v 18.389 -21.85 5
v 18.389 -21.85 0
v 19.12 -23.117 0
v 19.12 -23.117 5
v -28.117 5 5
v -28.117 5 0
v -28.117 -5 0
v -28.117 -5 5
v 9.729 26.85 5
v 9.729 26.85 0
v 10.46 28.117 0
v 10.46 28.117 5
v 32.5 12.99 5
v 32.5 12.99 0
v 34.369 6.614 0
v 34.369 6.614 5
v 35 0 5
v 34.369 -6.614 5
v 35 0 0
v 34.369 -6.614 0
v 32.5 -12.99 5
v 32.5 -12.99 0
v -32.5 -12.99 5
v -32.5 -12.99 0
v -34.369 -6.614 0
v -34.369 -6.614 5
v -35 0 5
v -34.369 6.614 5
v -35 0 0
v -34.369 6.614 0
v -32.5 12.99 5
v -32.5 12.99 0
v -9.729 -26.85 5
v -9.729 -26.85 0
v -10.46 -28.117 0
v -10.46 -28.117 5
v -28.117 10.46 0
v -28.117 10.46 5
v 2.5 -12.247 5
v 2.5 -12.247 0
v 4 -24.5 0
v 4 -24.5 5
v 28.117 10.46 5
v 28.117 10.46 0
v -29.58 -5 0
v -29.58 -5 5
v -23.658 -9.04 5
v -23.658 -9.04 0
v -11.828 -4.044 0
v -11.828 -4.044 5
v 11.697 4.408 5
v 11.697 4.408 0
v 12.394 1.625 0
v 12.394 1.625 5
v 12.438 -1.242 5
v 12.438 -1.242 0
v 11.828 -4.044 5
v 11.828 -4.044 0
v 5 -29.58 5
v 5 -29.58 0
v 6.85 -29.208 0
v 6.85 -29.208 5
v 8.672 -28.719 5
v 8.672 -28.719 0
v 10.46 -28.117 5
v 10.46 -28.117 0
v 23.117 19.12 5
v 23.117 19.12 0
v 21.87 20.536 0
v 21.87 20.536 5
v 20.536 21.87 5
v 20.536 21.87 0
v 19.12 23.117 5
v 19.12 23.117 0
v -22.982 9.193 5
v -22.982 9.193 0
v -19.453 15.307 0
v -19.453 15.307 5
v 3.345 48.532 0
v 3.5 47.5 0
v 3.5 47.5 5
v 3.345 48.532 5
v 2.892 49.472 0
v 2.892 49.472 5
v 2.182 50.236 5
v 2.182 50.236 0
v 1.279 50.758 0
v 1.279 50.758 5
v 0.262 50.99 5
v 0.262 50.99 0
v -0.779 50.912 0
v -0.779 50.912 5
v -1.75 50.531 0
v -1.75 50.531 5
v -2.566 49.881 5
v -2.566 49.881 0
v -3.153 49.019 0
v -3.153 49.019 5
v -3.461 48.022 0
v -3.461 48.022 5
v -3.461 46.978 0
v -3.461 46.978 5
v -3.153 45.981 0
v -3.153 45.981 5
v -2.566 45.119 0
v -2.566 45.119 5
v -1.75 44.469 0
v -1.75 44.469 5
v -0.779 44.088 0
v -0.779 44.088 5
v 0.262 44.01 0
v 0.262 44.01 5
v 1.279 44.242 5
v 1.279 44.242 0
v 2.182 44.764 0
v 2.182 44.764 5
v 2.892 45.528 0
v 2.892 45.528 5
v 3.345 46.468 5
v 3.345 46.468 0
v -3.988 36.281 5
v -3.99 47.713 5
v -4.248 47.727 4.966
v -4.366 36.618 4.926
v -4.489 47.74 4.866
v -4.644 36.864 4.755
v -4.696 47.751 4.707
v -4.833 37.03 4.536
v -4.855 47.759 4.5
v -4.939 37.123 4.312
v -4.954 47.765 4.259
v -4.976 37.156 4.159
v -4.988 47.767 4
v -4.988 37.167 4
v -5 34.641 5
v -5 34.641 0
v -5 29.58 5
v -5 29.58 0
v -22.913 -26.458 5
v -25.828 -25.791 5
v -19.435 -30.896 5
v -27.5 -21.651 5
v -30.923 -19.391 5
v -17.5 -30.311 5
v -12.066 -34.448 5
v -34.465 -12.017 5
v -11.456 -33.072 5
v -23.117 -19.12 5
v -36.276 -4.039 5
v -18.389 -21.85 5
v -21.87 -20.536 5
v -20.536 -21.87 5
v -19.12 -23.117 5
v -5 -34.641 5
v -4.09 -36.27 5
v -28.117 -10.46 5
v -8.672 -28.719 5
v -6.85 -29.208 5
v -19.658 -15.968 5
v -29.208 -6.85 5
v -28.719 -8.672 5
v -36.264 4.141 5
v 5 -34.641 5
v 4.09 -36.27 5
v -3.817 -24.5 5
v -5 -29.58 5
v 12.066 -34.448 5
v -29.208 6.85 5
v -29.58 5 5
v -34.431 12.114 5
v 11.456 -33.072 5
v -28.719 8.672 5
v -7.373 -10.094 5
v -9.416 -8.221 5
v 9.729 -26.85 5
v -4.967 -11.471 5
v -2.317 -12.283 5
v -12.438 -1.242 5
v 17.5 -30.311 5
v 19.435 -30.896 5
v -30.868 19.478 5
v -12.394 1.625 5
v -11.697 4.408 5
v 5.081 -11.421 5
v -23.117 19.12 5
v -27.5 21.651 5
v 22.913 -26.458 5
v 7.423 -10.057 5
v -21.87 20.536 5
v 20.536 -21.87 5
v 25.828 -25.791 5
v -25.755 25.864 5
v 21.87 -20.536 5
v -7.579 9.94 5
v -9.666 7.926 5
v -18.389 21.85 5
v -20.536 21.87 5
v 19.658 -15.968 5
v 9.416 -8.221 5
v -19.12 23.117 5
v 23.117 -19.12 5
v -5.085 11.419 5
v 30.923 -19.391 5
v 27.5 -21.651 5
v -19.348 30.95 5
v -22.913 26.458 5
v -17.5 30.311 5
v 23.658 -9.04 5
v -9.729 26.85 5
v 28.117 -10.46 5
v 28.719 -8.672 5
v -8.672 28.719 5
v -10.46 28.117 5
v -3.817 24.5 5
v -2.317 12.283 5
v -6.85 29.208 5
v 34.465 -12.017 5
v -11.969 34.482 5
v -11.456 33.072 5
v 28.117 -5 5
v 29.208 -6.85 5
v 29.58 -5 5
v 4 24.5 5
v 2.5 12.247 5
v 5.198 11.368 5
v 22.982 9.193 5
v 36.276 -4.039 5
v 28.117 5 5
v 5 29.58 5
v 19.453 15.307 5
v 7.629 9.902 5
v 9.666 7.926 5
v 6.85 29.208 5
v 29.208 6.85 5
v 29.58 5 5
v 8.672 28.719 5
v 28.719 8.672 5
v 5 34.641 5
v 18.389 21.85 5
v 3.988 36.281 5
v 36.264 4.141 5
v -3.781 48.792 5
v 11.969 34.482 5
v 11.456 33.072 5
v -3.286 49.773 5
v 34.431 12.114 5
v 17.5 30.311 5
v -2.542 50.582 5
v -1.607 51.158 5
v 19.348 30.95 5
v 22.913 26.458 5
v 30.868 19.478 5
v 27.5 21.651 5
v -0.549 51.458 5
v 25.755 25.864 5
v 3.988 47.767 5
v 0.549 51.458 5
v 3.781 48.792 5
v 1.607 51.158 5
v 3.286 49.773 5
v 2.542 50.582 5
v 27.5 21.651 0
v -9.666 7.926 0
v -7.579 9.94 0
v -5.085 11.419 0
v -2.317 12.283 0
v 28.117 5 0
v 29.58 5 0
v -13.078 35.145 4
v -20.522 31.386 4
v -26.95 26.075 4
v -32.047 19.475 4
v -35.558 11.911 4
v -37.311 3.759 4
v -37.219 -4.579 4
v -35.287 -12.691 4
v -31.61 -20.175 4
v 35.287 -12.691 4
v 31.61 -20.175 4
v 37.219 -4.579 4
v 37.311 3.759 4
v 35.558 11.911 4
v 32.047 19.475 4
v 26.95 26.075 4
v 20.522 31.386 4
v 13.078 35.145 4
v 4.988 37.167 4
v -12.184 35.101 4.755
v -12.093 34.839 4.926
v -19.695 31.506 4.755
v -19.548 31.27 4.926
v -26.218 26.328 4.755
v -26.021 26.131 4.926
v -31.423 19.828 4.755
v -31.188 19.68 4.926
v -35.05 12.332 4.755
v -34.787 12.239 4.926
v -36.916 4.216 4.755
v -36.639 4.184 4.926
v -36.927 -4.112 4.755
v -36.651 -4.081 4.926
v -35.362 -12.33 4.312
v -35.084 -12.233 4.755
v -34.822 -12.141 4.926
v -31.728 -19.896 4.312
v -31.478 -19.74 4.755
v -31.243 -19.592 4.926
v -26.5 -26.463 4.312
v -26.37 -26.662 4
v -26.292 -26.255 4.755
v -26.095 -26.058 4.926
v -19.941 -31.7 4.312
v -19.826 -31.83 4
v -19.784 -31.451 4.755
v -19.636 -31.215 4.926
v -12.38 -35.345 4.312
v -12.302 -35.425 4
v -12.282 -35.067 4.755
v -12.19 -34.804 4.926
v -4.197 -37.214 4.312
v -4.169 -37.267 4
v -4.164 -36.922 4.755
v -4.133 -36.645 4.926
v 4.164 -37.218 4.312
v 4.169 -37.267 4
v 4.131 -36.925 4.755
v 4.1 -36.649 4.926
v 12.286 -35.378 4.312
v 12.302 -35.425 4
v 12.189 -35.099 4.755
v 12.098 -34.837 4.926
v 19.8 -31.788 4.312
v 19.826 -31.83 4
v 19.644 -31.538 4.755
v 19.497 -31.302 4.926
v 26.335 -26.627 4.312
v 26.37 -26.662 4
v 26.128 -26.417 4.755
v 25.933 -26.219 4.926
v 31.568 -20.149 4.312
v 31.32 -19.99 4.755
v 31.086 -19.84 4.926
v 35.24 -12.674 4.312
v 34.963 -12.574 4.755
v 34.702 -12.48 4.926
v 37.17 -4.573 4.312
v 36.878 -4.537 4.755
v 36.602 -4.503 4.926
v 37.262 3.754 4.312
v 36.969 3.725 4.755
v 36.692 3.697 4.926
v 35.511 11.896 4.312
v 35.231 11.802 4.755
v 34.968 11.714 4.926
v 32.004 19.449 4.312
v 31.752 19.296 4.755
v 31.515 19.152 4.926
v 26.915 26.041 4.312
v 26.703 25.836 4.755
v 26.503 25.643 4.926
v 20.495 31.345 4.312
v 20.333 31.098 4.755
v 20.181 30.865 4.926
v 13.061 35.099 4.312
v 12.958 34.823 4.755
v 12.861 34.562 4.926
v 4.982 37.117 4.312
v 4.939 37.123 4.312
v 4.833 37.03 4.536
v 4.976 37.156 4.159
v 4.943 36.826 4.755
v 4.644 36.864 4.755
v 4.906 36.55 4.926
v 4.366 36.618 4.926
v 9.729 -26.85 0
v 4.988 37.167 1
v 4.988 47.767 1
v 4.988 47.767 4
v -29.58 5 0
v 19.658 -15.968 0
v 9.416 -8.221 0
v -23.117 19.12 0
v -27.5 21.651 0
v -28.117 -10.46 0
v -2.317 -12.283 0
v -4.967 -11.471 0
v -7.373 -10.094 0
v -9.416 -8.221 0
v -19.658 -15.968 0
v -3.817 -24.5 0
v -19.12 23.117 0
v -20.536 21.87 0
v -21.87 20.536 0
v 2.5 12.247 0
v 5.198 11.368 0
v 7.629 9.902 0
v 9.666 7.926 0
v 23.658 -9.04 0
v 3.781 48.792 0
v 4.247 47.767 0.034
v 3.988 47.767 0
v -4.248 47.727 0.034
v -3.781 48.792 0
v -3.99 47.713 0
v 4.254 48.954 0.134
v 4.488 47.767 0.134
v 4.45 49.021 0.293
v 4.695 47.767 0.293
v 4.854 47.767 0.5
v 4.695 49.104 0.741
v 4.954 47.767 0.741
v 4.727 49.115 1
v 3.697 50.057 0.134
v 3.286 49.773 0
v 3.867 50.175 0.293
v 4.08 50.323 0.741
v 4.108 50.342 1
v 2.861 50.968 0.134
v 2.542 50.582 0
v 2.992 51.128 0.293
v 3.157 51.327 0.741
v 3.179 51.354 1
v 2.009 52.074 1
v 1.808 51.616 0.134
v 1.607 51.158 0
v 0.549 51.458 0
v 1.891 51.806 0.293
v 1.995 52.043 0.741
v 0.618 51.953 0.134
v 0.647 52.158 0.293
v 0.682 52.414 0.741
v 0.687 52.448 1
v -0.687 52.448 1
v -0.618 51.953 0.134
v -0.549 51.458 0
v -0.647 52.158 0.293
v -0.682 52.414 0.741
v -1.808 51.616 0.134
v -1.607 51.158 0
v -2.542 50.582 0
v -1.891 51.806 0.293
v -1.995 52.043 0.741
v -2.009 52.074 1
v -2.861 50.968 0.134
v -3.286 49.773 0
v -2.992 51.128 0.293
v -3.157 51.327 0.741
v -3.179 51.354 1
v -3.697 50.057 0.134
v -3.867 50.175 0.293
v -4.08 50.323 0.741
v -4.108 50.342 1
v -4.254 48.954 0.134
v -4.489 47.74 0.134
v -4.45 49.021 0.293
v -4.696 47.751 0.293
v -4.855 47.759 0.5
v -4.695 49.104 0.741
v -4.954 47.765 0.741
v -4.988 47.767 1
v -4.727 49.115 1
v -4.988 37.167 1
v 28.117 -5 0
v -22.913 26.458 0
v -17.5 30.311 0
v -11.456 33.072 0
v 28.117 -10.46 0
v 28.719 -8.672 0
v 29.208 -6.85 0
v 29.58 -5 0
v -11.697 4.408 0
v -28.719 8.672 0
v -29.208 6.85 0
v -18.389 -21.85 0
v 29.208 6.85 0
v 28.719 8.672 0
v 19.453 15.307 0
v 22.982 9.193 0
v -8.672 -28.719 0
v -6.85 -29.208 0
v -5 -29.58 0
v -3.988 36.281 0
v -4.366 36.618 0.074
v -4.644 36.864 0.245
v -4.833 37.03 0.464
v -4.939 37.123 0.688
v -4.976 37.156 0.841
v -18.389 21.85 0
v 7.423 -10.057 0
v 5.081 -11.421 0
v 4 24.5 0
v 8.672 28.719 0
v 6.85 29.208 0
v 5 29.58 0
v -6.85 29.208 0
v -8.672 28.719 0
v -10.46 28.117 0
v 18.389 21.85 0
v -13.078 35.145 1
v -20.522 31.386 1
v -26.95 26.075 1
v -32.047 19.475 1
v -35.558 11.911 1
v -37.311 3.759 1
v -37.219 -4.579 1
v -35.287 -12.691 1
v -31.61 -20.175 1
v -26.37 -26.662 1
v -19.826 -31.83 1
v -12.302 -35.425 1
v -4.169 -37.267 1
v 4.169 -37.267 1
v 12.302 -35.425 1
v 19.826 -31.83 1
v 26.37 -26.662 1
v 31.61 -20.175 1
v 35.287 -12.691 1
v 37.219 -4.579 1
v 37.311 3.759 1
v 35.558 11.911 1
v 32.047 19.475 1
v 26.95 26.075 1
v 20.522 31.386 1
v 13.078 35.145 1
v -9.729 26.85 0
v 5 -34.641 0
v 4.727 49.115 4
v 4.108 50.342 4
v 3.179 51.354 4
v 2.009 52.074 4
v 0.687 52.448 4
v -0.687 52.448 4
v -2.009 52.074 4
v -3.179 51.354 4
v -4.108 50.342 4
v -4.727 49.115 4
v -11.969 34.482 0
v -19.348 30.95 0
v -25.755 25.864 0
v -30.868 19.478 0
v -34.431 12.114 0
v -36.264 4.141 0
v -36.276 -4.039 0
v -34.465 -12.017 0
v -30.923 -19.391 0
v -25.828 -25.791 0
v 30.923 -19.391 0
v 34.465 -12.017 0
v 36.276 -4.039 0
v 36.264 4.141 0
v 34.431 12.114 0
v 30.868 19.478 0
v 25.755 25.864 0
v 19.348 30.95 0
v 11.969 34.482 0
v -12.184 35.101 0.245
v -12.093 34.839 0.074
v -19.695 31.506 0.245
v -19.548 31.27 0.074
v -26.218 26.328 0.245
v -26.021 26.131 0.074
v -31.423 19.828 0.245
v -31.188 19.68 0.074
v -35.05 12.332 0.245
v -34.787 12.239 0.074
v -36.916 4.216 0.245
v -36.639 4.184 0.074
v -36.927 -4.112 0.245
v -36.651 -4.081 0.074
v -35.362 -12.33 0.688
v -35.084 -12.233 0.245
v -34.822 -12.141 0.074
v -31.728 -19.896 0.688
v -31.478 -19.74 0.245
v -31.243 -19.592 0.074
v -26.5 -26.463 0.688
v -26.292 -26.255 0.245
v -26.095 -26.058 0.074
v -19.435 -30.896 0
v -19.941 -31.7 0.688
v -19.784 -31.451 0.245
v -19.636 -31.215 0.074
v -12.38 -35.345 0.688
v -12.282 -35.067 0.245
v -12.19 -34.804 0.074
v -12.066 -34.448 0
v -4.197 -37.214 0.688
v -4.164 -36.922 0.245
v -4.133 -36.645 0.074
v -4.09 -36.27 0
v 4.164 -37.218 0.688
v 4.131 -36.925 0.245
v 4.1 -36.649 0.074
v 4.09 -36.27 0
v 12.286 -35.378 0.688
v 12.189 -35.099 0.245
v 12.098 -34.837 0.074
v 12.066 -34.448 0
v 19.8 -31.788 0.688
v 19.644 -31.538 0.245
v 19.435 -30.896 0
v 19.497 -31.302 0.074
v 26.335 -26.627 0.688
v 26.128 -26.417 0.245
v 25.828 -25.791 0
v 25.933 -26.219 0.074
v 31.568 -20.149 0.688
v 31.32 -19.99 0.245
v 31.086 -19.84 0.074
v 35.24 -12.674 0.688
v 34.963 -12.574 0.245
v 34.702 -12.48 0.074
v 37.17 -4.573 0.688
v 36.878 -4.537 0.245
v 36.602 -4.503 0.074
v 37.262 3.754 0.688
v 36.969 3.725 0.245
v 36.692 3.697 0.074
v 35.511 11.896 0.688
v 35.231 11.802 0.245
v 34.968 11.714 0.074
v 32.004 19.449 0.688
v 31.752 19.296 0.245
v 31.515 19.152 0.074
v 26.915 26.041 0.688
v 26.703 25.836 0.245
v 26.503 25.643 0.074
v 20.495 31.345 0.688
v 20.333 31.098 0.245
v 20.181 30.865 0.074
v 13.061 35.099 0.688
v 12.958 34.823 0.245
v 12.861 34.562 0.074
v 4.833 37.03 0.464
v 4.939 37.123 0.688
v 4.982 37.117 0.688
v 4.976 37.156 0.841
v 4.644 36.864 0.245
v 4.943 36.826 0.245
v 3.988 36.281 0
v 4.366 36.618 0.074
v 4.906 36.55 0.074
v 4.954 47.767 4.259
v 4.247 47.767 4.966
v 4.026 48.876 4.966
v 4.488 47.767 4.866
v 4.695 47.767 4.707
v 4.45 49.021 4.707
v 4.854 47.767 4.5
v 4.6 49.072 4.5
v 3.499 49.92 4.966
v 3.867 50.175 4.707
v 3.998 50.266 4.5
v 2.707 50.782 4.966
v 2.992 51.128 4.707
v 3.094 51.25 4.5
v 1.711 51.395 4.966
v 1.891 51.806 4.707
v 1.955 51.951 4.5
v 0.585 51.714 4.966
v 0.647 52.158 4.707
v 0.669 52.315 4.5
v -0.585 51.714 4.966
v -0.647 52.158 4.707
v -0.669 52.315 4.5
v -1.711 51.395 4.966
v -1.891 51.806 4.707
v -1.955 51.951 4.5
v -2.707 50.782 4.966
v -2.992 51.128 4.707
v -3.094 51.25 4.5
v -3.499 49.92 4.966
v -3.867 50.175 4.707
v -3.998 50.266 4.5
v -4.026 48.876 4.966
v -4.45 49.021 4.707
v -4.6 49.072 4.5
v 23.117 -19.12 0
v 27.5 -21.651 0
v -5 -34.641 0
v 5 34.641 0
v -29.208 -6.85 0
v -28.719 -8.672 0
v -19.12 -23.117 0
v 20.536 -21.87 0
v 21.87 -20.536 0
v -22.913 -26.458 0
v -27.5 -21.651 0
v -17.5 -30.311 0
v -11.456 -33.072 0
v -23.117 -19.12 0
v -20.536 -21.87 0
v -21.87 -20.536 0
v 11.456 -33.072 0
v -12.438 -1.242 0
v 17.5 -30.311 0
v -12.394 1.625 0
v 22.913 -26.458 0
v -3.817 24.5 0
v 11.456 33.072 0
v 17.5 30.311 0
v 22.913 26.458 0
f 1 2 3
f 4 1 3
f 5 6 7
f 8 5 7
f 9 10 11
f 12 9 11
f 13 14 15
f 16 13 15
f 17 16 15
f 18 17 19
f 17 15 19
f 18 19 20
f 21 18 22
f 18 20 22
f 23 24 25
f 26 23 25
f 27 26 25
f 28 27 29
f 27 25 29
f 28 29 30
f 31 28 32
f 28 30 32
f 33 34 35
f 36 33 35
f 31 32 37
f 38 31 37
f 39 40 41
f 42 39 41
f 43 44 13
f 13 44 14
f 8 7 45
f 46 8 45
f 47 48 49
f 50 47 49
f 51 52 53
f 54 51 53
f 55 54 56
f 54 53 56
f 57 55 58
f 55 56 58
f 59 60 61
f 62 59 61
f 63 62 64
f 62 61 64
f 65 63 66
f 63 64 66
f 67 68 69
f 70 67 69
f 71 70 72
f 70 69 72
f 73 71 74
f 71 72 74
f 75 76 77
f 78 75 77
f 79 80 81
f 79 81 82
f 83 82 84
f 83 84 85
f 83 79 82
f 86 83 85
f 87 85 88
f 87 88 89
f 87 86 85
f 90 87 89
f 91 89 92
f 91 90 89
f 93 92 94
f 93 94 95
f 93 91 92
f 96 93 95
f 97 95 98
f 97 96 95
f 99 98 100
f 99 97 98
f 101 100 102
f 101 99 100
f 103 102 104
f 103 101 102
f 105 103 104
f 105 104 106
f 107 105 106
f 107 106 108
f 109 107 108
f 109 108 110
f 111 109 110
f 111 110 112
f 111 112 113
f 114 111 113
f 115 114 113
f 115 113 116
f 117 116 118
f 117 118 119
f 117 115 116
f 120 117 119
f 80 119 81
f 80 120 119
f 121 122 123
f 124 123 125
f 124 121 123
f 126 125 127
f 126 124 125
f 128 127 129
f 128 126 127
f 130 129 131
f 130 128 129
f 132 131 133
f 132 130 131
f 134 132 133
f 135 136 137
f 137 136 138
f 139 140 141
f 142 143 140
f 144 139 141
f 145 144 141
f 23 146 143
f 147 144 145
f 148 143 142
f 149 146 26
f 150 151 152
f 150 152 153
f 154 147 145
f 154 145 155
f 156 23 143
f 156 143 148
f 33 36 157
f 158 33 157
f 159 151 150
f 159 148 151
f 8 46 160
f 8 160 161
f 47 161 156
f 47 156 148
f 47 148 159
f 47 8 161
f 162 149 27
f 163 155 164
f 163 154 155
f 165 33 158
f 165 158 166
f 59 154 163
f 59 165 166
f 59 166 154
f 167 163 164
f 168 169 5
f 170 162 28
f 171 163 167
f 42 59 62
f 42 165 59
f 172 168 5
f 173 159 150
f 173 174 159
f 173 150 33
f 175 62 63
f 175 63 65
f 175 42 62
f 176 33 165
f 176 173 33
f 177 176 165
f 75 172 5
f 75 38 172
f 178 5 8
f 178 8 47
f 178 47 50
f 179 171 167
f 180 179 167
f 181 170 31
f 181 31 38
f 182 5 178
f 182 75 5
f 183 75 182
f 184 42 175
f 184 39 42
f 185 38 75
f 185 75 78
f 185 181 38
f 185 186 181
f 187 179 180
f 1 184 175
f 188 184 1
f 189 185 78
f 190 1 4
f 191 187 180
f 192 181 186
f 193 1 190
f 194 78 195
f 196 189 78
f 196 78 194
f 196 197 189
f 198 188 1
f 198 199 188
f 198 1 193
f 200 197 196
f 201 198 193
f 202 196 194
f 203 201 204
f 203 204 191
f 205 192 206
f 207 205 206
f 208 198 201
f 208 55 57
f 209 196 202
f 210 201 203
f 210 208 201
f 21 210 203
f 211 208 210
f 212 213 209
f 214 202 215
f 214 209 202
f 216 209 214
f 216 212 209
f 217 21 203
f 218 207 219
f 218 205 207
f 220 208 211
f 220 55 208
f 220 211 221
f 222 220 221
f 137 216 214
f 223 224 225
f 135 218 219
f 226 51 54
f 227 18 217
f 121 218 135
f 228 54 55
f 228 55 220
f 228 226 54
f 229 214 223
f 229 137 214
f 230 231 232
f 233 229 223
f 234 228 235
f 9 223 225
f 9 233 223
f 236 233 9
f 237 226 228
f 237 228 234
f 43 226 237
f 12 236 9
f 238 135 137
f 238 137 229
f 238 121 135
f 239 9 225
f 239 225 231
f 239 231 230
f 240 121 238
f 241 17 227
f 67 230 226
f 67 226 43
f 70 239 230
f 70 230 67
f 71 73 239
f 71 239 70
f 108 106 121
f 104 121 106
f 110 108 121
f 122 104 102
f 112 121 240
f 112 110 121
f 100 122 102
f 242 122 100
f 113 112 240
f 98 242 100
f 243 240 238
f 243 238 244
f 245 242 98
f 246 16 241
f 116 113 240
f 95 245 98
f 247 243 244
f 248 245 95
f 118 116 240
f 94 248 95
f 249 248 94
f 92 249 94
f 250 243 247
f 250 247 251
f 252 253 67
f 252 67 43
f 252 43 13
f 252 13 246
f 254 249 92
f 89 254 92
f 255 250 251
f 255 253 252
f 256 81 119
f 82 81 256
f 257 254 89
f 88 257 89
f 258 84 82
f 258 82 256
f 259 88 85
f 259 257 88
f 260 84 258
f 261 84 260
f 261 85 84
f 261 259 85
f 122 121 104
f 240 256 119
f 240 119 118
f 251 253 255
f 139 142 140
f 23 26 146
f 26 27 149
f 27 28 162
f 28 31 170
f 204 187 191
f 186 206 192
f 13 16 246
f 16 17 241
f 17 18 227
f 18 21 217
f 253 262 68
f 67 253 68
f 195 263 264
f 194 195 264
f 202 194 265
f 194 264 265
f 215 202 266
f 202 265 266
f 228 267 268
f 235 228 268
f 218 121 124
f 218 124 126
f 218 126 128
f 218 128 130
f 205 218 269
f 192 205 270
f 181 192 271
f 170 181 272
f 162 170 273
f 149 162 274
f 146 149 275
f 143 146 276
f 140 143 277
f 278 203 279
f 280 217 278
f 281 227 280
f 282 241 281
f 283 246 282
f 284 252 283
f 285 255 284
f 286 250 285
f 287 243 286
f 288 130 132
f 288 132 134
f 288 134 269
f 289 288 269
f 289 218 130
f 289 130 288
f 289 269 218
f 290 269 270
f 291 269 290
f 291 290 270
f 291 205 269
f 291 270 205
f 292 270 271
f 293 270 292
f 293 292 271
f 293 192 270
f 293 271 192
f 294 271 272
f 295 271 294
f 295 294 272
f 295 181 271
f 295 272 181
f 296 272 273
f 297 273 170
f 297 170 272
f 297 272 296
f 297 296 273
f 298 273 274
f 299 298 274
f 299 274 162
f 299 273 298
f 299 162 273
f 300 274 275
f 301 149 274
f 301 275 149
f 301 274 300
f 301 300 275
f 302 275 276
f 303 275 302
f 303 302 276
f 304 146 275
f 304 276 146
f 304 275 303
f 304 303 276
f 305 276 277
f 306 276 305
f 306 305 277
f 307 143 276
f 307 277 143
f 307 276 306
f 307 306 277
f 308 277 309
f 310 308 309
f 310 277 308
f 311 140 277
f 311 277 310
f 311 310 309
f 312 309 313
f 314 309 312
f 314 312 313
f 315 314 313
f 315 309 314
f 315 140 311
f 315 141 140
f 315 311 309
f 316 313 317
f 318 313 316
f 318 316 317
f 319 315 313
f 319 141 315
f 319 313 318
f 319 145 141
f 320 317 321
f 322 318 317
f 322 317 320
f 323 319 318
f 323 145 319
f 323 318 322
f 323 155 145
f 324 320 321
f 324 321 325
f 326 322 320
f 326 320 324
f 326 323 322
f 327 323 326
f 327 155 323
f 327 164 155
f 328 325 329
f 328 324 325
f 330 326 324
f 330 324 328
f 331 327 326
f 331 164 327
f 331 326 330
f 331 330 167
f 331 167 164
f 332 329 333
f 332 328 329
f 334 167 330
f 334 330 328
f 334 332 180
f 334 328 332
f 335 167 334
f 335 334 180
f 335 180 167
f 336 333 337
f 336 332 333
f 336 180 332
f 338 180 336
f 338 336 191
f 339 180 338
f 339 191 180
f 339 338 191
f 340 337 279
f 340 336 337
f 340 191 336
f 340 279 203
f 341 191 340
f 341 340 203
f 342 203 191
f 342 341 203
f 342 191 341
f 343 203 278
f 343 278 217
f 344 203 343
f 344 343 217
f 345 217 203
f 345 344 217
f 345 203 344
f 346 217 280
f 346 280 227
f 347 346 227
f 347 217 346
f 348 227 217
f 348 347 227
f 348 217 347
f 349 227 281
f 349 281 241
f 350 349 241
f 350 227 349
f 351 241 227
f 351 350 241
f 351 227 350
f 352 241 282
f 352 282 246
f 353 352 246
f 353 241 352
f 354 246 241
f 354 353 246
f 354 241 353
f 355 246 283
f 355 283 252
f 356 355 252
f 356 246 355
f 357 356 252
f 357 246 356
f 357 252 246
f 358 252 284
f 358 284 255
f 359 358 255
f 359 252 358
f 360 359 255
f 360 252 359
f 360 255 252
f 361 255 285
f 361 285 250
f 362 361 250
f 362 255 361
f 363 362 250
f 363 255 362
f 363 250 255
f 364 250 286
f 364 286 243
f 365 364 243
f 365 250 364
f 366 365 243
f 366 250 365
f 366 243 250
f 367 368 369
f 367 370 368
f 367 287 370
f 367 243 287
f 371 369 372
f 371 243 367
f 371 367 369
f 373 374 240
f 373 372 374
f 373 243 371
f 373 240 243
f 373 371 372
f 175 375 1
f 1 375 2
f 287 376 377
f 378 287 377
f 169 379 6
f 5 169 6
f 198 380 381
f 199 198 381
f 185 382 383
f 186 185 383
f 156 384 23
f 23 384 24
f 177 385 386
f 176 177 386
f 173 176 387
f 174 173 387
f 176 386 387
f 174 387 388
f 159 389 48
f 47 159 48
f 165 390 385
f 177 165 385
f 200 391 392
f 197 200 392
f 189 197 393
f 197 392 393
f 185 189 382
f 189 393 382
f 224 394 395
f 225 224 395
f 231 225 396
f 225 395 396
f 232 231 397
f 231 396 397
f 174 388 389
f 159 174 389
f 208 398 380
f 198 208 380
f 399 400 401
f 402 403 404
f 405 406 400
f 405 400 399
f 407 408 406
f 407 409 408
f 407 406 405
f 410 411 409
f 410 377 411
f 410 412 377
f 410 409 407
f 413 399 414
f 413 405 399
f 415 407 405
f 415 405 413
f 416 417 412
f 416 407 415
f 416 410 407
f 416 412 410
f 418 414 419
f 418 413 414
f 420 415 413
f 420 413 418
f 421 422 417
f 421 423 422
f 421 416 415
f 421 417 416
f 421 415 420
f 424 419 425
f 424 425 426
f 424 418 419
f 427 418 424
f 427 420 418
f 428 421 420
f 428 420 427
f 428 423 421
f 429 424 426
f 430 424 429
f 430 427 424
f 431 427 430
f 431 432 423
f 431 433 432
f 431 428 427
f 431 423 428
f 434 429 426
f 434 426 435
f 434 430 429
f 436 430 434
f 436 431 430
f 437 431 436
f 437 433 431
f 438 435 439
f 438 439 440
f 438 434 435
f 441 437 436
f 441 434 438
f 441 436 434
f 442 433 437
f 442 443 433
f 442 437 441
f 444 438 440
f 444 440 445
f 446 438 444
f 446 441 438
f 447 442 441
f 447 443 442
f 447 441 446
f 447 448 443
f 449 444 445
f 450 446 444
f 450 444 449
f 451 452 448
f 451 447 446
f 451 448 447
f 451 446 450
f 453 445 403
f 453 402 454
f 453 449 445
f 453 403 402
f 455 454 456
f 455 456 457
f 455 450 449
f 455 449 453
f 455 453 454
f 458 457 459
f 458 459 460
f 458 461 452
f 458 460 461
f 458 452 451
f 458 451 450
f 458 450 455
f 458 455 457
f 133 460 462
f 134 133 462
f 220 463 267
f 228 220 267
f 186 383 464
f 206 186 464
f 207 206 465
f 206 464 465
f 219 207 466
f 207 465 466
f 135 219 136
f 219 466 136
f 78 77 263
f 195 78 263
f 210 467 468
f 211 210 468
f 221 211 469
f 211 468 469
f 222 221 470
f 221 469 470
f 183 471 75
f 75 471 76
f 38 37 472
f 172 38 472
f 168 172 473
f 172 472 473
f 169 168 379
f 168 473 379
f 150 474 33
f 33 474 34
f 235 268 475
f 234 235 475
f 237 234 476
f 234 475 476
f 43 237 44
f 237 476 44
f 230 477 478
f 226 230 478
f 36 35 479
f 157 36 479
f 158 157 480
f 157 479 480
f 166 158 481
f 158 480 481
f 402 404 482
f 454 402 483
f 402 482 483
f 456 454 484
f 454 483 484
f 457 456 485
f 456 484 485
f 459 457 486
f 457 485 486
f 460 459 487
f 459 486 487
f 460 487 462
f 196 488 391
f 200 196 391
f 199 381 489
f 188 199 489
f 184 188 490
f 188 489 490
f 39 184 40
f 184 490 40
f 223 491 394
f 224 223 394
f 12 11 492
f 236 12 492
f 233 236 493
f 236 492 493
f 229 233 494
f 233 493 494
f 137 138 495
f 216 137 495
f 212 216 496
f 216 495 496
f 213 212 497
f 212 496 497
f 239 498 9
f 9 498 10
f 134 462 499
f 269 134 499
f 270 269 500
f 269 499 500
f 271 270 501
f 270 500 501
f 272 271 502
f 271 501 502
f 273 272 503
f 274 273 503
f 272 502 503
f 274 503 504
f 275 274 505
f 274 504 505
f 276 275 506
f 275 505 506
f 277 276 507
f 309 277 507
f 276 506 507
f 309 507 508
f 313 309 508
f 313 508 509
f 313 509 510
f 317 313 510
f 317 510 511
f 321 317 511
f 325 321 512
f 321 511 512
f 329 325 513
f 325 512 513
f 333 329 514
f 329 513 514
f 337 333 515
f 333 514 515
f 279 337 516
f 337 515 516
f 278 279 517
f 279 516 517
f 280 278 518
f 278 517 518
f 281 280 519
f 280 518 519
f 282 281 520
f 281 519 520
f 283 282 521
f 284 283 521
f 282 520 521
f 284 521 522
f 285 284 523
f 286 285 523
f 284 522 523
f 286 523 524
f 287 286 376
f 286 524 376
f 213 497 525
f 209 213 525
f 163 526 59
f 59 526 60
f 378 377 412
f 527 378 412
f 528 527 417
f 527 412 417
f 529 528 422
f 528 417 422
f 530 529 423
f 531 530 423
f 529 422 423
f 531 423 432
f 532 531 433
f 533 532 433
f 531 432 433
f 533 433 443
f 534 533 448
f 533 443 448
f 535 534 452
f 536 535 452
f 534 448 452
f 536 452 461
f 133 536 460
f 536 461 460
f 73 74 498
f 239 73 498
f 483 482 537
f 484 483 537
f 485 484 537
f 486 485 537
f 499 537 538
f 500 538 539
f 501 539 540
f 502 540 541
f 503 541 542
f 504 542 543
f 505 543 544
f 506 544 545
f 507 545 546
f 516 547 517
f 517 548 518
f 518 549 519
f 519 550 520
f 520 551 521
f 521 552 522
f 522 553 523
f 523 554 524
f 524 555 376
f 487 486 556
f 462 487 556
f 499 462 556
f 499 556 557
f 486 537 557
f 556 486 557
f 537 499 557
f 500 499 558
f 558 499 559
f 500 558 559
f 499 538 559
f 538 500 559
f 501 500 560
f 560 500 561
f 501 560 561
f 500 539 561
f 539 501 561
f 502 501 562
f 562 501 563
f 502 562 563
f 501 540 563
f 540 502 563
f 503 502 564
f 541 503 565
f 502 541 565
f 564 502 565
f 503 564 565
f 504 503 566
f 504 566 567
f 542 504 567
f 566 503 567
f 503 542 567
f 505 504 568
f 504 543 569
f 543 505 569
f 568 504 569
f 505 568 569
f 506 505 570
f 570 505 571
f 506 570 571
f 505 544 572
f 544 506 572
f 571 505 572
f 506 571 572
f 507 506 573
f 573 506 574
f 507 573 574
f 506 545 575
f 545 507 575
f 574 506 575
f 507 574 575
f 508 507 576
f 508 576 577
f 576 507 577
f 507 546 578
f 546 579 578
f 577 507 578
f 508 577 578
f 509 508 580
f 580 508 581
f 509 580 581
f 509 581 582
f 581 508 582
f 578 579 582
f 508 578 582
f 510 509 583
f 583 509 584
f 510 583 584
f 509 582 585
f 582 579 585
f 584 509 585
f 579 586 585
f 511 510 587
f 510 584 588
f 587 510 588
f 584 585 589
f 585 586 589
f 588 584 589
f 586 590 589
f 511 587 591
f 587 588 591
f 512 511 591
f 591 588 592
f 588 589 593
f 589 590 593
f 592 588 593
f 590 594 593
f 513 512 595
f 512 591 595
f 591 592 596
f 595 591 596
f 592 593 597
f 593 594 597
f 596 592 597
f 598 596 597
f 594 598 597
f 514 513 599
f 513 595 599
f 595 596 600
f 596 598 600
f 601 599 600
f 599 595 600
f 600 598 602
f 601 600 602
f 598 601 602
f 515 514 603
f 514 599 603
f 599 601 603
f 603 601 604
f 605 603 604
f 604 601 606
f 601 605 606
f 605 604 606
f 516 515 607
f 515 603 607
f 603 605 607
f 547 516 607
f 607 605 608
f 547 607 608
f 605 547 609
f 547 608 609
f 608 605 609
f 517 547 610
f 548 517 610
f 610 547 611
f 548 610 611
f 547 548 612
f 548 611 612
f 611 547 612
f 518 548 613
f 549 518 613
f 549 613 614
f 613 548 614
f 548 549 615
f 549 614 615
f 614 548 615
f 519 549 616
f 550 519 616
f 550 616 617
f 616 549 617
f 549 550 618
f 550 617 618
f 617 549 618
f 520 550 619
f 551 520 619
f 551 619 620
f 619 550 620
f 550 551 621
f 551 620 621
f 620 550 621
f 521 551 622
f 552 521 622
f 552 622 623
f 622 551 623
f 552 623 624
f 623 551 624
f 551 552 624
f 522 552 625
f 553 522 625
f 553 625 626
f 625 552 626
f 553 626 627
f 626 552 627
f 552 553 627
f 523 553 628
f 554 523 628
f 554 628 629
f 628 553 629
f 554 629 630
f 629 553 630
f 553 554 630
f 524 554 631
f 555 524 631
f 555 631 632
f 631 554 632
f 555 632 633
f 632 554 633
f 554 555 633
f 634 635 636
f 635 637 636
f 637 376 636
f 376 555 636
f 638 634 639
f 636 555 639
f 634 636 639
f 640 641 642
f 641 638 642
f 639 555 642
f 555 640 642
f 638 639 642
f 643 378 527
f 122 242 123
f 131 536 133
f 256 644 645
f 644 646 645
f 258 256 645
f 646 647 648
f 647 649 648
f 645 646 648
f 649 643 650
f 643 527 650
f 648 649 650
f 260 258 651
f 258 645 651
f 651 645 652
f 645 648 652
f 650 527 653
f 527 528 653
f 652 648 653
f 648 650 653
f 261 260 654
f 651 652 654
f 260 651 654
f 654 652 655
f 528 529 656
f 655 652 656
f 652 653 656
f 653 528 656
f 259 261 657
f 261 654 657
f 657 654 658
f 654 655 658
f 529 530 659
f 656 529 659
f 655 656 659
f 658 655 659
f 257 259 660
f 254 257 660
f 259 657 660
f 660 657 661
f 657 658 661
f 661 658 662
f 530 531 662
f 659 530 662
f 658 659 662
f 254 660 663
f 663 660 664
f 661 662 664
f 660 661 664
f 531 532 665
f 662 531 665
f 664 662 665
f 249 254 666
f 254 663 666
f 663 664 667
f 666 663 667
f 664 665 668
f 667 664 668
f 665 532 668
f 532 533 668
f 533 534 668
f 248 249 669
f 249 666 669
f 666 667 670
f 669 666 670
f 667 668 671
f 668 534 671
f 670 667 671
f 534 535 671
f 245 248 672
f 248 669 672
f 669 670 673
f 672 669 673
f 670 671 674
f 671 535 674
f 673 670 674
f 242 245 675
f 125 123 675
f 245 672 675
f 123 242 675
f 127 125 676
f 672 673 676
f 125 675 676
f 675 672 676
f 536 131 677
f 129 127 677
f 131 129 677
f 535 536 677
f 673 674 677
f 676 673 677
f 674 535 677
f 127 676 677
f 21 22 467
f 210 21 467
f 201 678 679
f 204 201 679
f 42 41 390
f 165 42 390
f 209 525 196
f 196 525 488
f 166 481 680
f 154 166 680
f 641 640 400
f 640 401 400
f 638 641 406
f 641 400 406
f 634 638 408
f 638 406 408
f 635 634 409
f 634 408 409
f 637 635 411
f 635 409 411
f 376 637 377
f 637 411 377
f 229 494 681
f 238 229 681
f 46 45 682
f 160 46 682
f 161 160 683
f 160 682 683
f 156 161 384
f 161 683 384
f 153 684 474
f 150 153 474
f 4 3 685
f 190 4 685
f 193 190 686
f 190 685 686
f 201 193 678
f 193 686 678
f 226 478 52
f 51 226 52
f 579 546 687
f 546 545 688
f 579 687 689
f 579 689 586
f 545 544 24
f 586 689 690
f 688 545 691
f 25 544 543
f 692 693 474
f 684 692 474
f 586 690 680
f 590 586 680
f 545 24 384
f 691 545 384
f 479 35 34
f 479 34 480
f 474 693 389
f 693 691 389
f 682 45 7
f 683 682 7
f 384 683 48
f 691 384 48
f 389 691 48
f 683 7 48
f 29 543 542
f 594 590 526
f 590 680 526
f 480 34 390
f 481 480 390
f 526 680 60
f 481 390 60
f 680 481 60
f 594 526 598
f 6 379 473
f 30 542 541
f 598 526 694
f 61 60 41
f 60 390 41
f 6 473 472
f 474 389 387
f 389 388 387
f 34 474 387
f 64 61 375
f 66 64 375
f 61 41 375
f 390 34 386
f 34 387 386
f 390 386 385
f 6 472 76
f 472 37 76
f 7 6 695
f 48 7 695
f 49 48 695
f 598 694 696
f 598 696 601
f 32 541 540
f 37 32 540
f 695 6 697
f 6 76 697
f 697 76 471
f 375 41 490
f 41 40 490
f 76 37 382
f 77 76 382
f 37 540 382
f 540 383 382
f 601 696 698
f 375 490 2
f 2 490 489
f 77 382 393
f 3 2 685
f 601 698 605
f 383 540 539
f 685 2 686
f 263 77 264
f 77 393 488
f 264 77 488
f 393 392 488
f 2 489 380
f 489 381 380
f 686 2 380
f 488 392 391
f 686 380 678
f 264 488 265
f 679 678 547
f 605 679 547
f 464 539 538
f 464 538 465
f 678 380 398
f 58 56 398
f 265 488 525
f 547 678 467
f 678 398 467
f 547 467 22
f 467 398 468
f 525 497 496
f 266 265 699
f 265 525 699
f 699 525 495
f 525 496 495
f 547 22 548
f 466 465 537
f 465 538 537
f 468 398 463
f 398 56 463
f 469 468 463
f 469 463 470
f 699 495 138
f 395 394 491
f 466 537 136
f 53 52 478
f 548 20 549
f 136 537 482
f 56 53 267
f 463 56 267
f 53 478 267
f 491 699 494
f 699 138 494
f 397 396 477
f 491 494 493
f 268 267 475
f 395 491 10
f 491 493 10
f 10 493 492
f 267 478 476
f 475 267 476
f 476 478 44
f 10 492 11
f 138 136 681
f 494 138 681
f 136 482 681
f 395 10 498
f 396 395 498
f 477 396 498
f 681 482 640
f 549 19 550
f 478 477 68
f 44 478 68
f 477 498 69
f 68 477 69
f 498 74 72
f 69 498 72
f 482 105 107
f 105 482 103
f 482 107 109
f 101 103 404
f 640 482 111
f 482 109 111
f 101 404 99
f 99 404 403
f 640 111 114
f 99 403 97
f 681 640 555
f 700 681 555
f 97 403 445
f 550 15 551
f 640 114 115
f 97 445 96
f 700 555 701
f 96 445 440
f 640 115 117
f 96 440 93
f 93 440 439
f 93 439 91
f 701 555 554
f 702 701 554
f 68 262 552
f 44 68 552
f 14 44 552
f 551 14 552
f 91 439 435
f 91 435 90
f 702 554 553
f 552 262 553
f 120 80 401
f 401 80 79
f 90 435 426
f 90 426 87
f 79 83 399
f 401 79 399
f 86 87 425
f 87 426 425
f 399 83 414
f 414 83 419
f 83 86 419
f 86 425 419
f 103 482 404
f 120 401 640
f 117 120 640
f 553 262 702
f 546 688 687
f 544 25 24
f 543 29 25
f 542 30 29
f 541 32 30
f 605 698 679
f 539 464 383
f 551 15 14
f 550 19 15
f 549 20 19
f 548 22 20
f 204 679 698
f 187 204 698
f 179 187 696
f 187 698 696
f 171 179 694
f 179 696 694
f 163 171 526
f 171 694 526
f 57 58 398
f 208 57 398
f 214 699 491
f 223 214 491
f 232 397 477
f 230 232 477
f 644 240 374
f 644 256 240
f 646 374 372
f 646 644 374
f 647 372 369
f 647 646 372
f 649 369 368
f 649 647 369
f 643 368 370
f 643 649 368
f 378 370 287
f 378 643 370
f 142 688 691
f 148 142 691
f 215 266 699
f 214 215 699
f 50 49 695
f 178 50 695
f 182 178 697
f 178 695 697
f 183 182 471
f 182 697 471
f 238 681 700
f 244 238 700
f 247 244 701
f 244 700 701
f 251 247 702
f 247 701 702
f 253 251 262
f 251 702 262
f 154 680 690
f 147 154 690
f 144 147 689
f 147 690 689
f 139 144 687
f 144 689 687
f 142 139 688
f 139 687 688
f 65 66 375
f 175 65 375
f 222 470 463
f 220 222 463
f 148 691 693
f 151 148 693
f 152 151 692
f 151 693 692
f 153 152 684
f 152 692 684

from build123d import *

# Parameters (mm, degrees)
F1_DEPTH = 5
F0_R     = 3.5
F2_DEPTH = 5
F3_R     = 1


with BuildPart() as f1:
    # F0 (on Top) → F1 (new body)
    with BuildSketch(Plane.XY):
        with BuildLine():
            ThreePointArc((-4.988375268, 37.1667339456), (-24.6899364868, -28.2251135742), (37.5, 0))
            ThreePointArc((37.5, 0), (28.2251135742, 24.6899364868), (4.988375268, 37.1667339456))
            ThreePointArc((4.988375268, 37.1667339456), (0, 37.5), (-4.988375268, 37.1667339456))
        make_face()
        with BuildLine():
            Line((-5, -29.5803989155), (-5, -30))
            Line((-5, -30), (-5, -34.6410161514))
            ThreePointArc((-5, -34.6410161514), (-17.5, -30.3108891325), (-27.5, -21.6506350946))
            Line((-27.5, -21.6506350946), (-23.1173769149, -19.1203264767))
            ThreePointArc((-23.1173769149, -19.1203264767), (-21.2132034356, -21.2132034356), (-19.1203264767, -23.1173769149))
            Line((-19.1203264767, -23.1173769149), (-18.3888154764, -21.8503626961))
            Line((-18.3888154764, -21.8503626961), (-9.7285614385, -26.8503626961))
            Line((-9.7285614385, -26.8503626961), (-10.4600724388, -28.1173769149))
            ThreePointArc((-10.4600724388, -28.1173769149), (-7.7645713531, -28.9777747887), (-5, -29.5803989155))
        make_face(mode=Mode.SUBTRACT)
        with BuildLine():
            ThreePointArc((-32.5, -12.9903810568), (-35, 0), (-32.5, 12.9903810568))
            Line((-32.5, 12.9903810568), (-28.1173769149, 10.4600724388))
            ThreePointArc((-28.1173769149, 10.4600724388), (-28.9777747887, 7.7645713531), (-29.5803989155, 5))
            Line((-29.5803989155, 5), (-28.1173769149, 5))
            Line((-28.1173769149, 5), (-28.1173769149, -5))
            Line((-28.1173769149, -5), (-29.5803989155, -5))
            ThreePointArc((-29.5803989155, -5), (-28.9777747887, -7.7645713531), (-28.1173769149, -10.4600724388))
            Line((-28.1173769149, -10.4600724388), (-32.5, -12.9903810568))
        make_face(mode=Mode.SUBTRACT)
        with BuildLine():
            Line((5, -30), (5, -29.5803989155))
            ThreePointArc((5, -29.5803989155), (7.7645713531, -28.9777747887), (10.4600724388, -28.1173769149))
            Line((10.4600724388, -28.1173769149), (9.7285614385, -26.8503626961))
            Line((9.7285614385, -26.8503626961), (18.3888154764, -21.8503626961))
            Line((18.3888154764, -21.8503626961), (19.1203264767, -23.1173769149))
            ThreePointArc((19.1203264767, -23.1173769149), (21.2132034356, -21.2132034356), (23.1173769149, -19.1203264767))
            Line((23.1173769149, -19.1203264767), (27.5, -21.6506350946))
            ThreePointArc((27.5, -21.6506350946), (17.5, -30.3108891325), (5, -34.6410161514))
            Line((5, -34.6410161514), (5, -30))
        make_face(mode=Mode.SUBTRACT)
        with BuildLine():
            ThreePointArc((-9.6656079434, 7.926286841), (-6.3749366407, 10.7522175772), (-2.3166453596, 12.2834504223))
            Line((-2.3166453596, 12.2834504223), (-3.8166453596, 24.5))
            Line((-3.8166453596, 24.5), (4, 24.5))
            Line((4, 24.5), (2.5, 12.2474487139))
            ThreePointArc((2.5, 12.2474487139), (6.4551230926, 10.7042695154), (9.6656079434, 7.926286841))
            Line((9.6656079434, 7.926286841), (19.4529138373, 15.3065648785))
            Line((19.4529138373, 15.3065648785), (22.9823309481, 9.1934351215))
            Line((22.9823309481, 9.1934351215), (11.6971697336, 4.4075186015))
            ThreePointArc((11.6971697336, 4.4075186015), (12.4985113757, 0.1929077306), (11.827620909, -4.0444262427))
            Line((11.827620909, -4.0444262427), (23.6581671568, -9.040247023))
            Line((23.6581671568, -9.040247023), (19.6581671568, -15.9684502533))
            Line((19.6581671568, -15.9684502533), (9.4163863244, -8.2208070522))
            ThreePointArc((9.4163863244, -8.2208070522), (6.2891594451, -10.8026141963), (2.5, -12.2474487139))
            Line((2.5, -12.2474487139), (4, -24.5))
            Line((4, -24.5), (-3.8166453596, -24.5))
            Line((-3.8166453596, -24.5), (-2.3166453596, -12.2834504223))
            ThreePointArc((-2.3166453596, -12.2834504223), (-6.2082425785, -10.849319061), (-9.4163863244, -8.2208070522))
            Line((-9.4163863244, -8.2208070522), (-19.6581671568, -15.9684502533))
            Line((-19.6581671568, -15.9684502533), (-23.6581671568, -9.040247023))
            Line((-23.6581671568, -9.040247023), (-11.827620909, -4.0444262427))
            ThreePointArc((-11.827620909, -4.0444262427), (-12.4985113757, 0.1929077306), (-11.6971697336, 4.4075186015))
            Line((-11.6971697336, 4.4075186015), (-22.9823309481, 9.1934351215))
            Line((-22.9823309481, 9.1934351215), (-19.4529138373, 15.3065648785))
            Line((-19.4529138373, 15.3065648785), (-9.6656079434, 7.926286841))
        make_face(mode=Mode.SUBTRACT)
        with BuildLine():
            Line((28.1173769149, 10.4600724388), (32.5, 12.9903810568))
            ThreePointArc((32.5, 12.9903810568), (35, 0), (32.5, -12.9903810568))
            Line((32.5, -12.9903810568), (28.1173769149, -10.4600724388))
            ThreePointArc((28.1173769149, -10.4600724388), (28.9777747887, -7.7645713531), (29.5803989155, -5))
            Line((29.5803989155, -5), (28.1173769149, -5))
            Line((28.1173769149, -5), (28.1173769149, 5))
            Line((28.1173769149, 5), (29.5803989155, 5))
            ThreePointArc((29.5803989155, 5), (28.9777747887, 7.7645713531), (28.1173769149, 10.4600724388))
        make_face(mode=Mode.SUBTRACT)
        with BuildLine():
            Line((-5, 30), (-5, 29.5803989155))
            ThreePointArc((-5, 29.5803989155), (-7.7645713531, 28.9777747887), (-10.4600724388, 28.1173769149))
            Line((-10.4600724388, 28.1173769149), (-9.7285614385, 26.8503626961))
            Line((-9.7285614385, 26.8503626961), (-18.3888154764, 21.8503626961))
            Line((-18.3888154764, 21.8503626961), (-19.1203264767, 23.1173769149))
            ThreePointArc((-19.1203264767, 23.1173769149), (-21.2132034356, 21.2132034356), (-23.1173769149, 19.1203264767))
            Line((-23.1173769149, 19.1203264767), (-27.5, 21.6506350946))
            ThreePointArc((-27.5, 21.6506350946), (-17.5, 30.3108891325), (-5, 34.6410161514))
            Line((-5, 34.6410161514), (-5, 30))
        make_face(mode=Mode.SUBTRACT)
        with BuildLine():
            Line((5, 29.5803989155), (5, 30))
            Line((5, 30), (5, 34.6410161514))
            ThreePointArc((5, 34.6410161514), (17.5, 30.3108891325), (27.5, 21.6506350946))
            Line((27.5, 21.6506350946), (23.1173769149, 19.1203264767))
            ThreePointArc((23.1173769149, 19.1203264767), (21.2132034356, 21.2132034356), (19.1203264767, 23.1173769149))
            Line((19.1203264767, 23.1173769149), (18.3888154764, 21.8503626961))
            Line((18.3888154764, 21.8503626961), (9.7285614385, 26.8503626961))
            Line((9.7285614385, 26.8503626961), (10.4600724388, 28.1173769149))
            ThreePointArc((10.4600724388, 28.1173769149), (7.7645713531, 28.9777747887), (5, 29.5803989155))
        make_face(mode=Mode.SUBTRACT)
    extrude(amount=F1_DEPTH)

    # F0 (on Top) → F2 (join)
    with BuildSketch(Plane.XY):
        with BuildLine():
            ThreePointArc((-4.988375268, 37.1667339456), (0, 37.5), (4.988375268, 37.1667339456))
            Line((4.988375268, 37.1667339456), (4.988375268, 47.2334879431))
            ThreePointArc((4.988375268, 47.2334879431), (0, 42.5045103852), (-4.988375268, 47.2334879431))
            Line((-4.988375268, 47.2334879431), (-4.988375268, 37.1667339456))
        make_face()
        with BuildLine():
            ThreePointArc((-4.988375268, 47.2334879431), (0, 42.5045103852), (4.988375268, 47.2334879431))
            Line((4.988375268, 47.2334879431), (4.988375268, 47.7665120569))
            ThreePointArc((4.988375268, 47.7665120569), (0, 52.4954896148), (-4.988375268, 47.7665120569))
            Line((-4.988375268, 47.7665120569), (-4.988375268, 47.2334879431))
        make_face()
        with Locations((0, 47.5)):
            Circle(F0_R, mode=Mode.SUBTRACT)
    extrude(amount=F2_DEPTH)

    # F3
    f3_edges = [f1.edges().sort_by_distance(p)[0] for p in [
        (4.988375, 42.466623, 0),
        (-4.988375, 42.466623, 0),
        (4.988375, 42.466623, 5),
        (-4.988375, 42.466623, 5),
        (0, 52.49549, 5),
        (0, 52.49549, 0),
        (-24.689936, -28.225114, 0),
        (-24.689936, -28.225114, 5),
    ]]
    fillet(f3_edges, radius=F3_R)


solid = f1.part
